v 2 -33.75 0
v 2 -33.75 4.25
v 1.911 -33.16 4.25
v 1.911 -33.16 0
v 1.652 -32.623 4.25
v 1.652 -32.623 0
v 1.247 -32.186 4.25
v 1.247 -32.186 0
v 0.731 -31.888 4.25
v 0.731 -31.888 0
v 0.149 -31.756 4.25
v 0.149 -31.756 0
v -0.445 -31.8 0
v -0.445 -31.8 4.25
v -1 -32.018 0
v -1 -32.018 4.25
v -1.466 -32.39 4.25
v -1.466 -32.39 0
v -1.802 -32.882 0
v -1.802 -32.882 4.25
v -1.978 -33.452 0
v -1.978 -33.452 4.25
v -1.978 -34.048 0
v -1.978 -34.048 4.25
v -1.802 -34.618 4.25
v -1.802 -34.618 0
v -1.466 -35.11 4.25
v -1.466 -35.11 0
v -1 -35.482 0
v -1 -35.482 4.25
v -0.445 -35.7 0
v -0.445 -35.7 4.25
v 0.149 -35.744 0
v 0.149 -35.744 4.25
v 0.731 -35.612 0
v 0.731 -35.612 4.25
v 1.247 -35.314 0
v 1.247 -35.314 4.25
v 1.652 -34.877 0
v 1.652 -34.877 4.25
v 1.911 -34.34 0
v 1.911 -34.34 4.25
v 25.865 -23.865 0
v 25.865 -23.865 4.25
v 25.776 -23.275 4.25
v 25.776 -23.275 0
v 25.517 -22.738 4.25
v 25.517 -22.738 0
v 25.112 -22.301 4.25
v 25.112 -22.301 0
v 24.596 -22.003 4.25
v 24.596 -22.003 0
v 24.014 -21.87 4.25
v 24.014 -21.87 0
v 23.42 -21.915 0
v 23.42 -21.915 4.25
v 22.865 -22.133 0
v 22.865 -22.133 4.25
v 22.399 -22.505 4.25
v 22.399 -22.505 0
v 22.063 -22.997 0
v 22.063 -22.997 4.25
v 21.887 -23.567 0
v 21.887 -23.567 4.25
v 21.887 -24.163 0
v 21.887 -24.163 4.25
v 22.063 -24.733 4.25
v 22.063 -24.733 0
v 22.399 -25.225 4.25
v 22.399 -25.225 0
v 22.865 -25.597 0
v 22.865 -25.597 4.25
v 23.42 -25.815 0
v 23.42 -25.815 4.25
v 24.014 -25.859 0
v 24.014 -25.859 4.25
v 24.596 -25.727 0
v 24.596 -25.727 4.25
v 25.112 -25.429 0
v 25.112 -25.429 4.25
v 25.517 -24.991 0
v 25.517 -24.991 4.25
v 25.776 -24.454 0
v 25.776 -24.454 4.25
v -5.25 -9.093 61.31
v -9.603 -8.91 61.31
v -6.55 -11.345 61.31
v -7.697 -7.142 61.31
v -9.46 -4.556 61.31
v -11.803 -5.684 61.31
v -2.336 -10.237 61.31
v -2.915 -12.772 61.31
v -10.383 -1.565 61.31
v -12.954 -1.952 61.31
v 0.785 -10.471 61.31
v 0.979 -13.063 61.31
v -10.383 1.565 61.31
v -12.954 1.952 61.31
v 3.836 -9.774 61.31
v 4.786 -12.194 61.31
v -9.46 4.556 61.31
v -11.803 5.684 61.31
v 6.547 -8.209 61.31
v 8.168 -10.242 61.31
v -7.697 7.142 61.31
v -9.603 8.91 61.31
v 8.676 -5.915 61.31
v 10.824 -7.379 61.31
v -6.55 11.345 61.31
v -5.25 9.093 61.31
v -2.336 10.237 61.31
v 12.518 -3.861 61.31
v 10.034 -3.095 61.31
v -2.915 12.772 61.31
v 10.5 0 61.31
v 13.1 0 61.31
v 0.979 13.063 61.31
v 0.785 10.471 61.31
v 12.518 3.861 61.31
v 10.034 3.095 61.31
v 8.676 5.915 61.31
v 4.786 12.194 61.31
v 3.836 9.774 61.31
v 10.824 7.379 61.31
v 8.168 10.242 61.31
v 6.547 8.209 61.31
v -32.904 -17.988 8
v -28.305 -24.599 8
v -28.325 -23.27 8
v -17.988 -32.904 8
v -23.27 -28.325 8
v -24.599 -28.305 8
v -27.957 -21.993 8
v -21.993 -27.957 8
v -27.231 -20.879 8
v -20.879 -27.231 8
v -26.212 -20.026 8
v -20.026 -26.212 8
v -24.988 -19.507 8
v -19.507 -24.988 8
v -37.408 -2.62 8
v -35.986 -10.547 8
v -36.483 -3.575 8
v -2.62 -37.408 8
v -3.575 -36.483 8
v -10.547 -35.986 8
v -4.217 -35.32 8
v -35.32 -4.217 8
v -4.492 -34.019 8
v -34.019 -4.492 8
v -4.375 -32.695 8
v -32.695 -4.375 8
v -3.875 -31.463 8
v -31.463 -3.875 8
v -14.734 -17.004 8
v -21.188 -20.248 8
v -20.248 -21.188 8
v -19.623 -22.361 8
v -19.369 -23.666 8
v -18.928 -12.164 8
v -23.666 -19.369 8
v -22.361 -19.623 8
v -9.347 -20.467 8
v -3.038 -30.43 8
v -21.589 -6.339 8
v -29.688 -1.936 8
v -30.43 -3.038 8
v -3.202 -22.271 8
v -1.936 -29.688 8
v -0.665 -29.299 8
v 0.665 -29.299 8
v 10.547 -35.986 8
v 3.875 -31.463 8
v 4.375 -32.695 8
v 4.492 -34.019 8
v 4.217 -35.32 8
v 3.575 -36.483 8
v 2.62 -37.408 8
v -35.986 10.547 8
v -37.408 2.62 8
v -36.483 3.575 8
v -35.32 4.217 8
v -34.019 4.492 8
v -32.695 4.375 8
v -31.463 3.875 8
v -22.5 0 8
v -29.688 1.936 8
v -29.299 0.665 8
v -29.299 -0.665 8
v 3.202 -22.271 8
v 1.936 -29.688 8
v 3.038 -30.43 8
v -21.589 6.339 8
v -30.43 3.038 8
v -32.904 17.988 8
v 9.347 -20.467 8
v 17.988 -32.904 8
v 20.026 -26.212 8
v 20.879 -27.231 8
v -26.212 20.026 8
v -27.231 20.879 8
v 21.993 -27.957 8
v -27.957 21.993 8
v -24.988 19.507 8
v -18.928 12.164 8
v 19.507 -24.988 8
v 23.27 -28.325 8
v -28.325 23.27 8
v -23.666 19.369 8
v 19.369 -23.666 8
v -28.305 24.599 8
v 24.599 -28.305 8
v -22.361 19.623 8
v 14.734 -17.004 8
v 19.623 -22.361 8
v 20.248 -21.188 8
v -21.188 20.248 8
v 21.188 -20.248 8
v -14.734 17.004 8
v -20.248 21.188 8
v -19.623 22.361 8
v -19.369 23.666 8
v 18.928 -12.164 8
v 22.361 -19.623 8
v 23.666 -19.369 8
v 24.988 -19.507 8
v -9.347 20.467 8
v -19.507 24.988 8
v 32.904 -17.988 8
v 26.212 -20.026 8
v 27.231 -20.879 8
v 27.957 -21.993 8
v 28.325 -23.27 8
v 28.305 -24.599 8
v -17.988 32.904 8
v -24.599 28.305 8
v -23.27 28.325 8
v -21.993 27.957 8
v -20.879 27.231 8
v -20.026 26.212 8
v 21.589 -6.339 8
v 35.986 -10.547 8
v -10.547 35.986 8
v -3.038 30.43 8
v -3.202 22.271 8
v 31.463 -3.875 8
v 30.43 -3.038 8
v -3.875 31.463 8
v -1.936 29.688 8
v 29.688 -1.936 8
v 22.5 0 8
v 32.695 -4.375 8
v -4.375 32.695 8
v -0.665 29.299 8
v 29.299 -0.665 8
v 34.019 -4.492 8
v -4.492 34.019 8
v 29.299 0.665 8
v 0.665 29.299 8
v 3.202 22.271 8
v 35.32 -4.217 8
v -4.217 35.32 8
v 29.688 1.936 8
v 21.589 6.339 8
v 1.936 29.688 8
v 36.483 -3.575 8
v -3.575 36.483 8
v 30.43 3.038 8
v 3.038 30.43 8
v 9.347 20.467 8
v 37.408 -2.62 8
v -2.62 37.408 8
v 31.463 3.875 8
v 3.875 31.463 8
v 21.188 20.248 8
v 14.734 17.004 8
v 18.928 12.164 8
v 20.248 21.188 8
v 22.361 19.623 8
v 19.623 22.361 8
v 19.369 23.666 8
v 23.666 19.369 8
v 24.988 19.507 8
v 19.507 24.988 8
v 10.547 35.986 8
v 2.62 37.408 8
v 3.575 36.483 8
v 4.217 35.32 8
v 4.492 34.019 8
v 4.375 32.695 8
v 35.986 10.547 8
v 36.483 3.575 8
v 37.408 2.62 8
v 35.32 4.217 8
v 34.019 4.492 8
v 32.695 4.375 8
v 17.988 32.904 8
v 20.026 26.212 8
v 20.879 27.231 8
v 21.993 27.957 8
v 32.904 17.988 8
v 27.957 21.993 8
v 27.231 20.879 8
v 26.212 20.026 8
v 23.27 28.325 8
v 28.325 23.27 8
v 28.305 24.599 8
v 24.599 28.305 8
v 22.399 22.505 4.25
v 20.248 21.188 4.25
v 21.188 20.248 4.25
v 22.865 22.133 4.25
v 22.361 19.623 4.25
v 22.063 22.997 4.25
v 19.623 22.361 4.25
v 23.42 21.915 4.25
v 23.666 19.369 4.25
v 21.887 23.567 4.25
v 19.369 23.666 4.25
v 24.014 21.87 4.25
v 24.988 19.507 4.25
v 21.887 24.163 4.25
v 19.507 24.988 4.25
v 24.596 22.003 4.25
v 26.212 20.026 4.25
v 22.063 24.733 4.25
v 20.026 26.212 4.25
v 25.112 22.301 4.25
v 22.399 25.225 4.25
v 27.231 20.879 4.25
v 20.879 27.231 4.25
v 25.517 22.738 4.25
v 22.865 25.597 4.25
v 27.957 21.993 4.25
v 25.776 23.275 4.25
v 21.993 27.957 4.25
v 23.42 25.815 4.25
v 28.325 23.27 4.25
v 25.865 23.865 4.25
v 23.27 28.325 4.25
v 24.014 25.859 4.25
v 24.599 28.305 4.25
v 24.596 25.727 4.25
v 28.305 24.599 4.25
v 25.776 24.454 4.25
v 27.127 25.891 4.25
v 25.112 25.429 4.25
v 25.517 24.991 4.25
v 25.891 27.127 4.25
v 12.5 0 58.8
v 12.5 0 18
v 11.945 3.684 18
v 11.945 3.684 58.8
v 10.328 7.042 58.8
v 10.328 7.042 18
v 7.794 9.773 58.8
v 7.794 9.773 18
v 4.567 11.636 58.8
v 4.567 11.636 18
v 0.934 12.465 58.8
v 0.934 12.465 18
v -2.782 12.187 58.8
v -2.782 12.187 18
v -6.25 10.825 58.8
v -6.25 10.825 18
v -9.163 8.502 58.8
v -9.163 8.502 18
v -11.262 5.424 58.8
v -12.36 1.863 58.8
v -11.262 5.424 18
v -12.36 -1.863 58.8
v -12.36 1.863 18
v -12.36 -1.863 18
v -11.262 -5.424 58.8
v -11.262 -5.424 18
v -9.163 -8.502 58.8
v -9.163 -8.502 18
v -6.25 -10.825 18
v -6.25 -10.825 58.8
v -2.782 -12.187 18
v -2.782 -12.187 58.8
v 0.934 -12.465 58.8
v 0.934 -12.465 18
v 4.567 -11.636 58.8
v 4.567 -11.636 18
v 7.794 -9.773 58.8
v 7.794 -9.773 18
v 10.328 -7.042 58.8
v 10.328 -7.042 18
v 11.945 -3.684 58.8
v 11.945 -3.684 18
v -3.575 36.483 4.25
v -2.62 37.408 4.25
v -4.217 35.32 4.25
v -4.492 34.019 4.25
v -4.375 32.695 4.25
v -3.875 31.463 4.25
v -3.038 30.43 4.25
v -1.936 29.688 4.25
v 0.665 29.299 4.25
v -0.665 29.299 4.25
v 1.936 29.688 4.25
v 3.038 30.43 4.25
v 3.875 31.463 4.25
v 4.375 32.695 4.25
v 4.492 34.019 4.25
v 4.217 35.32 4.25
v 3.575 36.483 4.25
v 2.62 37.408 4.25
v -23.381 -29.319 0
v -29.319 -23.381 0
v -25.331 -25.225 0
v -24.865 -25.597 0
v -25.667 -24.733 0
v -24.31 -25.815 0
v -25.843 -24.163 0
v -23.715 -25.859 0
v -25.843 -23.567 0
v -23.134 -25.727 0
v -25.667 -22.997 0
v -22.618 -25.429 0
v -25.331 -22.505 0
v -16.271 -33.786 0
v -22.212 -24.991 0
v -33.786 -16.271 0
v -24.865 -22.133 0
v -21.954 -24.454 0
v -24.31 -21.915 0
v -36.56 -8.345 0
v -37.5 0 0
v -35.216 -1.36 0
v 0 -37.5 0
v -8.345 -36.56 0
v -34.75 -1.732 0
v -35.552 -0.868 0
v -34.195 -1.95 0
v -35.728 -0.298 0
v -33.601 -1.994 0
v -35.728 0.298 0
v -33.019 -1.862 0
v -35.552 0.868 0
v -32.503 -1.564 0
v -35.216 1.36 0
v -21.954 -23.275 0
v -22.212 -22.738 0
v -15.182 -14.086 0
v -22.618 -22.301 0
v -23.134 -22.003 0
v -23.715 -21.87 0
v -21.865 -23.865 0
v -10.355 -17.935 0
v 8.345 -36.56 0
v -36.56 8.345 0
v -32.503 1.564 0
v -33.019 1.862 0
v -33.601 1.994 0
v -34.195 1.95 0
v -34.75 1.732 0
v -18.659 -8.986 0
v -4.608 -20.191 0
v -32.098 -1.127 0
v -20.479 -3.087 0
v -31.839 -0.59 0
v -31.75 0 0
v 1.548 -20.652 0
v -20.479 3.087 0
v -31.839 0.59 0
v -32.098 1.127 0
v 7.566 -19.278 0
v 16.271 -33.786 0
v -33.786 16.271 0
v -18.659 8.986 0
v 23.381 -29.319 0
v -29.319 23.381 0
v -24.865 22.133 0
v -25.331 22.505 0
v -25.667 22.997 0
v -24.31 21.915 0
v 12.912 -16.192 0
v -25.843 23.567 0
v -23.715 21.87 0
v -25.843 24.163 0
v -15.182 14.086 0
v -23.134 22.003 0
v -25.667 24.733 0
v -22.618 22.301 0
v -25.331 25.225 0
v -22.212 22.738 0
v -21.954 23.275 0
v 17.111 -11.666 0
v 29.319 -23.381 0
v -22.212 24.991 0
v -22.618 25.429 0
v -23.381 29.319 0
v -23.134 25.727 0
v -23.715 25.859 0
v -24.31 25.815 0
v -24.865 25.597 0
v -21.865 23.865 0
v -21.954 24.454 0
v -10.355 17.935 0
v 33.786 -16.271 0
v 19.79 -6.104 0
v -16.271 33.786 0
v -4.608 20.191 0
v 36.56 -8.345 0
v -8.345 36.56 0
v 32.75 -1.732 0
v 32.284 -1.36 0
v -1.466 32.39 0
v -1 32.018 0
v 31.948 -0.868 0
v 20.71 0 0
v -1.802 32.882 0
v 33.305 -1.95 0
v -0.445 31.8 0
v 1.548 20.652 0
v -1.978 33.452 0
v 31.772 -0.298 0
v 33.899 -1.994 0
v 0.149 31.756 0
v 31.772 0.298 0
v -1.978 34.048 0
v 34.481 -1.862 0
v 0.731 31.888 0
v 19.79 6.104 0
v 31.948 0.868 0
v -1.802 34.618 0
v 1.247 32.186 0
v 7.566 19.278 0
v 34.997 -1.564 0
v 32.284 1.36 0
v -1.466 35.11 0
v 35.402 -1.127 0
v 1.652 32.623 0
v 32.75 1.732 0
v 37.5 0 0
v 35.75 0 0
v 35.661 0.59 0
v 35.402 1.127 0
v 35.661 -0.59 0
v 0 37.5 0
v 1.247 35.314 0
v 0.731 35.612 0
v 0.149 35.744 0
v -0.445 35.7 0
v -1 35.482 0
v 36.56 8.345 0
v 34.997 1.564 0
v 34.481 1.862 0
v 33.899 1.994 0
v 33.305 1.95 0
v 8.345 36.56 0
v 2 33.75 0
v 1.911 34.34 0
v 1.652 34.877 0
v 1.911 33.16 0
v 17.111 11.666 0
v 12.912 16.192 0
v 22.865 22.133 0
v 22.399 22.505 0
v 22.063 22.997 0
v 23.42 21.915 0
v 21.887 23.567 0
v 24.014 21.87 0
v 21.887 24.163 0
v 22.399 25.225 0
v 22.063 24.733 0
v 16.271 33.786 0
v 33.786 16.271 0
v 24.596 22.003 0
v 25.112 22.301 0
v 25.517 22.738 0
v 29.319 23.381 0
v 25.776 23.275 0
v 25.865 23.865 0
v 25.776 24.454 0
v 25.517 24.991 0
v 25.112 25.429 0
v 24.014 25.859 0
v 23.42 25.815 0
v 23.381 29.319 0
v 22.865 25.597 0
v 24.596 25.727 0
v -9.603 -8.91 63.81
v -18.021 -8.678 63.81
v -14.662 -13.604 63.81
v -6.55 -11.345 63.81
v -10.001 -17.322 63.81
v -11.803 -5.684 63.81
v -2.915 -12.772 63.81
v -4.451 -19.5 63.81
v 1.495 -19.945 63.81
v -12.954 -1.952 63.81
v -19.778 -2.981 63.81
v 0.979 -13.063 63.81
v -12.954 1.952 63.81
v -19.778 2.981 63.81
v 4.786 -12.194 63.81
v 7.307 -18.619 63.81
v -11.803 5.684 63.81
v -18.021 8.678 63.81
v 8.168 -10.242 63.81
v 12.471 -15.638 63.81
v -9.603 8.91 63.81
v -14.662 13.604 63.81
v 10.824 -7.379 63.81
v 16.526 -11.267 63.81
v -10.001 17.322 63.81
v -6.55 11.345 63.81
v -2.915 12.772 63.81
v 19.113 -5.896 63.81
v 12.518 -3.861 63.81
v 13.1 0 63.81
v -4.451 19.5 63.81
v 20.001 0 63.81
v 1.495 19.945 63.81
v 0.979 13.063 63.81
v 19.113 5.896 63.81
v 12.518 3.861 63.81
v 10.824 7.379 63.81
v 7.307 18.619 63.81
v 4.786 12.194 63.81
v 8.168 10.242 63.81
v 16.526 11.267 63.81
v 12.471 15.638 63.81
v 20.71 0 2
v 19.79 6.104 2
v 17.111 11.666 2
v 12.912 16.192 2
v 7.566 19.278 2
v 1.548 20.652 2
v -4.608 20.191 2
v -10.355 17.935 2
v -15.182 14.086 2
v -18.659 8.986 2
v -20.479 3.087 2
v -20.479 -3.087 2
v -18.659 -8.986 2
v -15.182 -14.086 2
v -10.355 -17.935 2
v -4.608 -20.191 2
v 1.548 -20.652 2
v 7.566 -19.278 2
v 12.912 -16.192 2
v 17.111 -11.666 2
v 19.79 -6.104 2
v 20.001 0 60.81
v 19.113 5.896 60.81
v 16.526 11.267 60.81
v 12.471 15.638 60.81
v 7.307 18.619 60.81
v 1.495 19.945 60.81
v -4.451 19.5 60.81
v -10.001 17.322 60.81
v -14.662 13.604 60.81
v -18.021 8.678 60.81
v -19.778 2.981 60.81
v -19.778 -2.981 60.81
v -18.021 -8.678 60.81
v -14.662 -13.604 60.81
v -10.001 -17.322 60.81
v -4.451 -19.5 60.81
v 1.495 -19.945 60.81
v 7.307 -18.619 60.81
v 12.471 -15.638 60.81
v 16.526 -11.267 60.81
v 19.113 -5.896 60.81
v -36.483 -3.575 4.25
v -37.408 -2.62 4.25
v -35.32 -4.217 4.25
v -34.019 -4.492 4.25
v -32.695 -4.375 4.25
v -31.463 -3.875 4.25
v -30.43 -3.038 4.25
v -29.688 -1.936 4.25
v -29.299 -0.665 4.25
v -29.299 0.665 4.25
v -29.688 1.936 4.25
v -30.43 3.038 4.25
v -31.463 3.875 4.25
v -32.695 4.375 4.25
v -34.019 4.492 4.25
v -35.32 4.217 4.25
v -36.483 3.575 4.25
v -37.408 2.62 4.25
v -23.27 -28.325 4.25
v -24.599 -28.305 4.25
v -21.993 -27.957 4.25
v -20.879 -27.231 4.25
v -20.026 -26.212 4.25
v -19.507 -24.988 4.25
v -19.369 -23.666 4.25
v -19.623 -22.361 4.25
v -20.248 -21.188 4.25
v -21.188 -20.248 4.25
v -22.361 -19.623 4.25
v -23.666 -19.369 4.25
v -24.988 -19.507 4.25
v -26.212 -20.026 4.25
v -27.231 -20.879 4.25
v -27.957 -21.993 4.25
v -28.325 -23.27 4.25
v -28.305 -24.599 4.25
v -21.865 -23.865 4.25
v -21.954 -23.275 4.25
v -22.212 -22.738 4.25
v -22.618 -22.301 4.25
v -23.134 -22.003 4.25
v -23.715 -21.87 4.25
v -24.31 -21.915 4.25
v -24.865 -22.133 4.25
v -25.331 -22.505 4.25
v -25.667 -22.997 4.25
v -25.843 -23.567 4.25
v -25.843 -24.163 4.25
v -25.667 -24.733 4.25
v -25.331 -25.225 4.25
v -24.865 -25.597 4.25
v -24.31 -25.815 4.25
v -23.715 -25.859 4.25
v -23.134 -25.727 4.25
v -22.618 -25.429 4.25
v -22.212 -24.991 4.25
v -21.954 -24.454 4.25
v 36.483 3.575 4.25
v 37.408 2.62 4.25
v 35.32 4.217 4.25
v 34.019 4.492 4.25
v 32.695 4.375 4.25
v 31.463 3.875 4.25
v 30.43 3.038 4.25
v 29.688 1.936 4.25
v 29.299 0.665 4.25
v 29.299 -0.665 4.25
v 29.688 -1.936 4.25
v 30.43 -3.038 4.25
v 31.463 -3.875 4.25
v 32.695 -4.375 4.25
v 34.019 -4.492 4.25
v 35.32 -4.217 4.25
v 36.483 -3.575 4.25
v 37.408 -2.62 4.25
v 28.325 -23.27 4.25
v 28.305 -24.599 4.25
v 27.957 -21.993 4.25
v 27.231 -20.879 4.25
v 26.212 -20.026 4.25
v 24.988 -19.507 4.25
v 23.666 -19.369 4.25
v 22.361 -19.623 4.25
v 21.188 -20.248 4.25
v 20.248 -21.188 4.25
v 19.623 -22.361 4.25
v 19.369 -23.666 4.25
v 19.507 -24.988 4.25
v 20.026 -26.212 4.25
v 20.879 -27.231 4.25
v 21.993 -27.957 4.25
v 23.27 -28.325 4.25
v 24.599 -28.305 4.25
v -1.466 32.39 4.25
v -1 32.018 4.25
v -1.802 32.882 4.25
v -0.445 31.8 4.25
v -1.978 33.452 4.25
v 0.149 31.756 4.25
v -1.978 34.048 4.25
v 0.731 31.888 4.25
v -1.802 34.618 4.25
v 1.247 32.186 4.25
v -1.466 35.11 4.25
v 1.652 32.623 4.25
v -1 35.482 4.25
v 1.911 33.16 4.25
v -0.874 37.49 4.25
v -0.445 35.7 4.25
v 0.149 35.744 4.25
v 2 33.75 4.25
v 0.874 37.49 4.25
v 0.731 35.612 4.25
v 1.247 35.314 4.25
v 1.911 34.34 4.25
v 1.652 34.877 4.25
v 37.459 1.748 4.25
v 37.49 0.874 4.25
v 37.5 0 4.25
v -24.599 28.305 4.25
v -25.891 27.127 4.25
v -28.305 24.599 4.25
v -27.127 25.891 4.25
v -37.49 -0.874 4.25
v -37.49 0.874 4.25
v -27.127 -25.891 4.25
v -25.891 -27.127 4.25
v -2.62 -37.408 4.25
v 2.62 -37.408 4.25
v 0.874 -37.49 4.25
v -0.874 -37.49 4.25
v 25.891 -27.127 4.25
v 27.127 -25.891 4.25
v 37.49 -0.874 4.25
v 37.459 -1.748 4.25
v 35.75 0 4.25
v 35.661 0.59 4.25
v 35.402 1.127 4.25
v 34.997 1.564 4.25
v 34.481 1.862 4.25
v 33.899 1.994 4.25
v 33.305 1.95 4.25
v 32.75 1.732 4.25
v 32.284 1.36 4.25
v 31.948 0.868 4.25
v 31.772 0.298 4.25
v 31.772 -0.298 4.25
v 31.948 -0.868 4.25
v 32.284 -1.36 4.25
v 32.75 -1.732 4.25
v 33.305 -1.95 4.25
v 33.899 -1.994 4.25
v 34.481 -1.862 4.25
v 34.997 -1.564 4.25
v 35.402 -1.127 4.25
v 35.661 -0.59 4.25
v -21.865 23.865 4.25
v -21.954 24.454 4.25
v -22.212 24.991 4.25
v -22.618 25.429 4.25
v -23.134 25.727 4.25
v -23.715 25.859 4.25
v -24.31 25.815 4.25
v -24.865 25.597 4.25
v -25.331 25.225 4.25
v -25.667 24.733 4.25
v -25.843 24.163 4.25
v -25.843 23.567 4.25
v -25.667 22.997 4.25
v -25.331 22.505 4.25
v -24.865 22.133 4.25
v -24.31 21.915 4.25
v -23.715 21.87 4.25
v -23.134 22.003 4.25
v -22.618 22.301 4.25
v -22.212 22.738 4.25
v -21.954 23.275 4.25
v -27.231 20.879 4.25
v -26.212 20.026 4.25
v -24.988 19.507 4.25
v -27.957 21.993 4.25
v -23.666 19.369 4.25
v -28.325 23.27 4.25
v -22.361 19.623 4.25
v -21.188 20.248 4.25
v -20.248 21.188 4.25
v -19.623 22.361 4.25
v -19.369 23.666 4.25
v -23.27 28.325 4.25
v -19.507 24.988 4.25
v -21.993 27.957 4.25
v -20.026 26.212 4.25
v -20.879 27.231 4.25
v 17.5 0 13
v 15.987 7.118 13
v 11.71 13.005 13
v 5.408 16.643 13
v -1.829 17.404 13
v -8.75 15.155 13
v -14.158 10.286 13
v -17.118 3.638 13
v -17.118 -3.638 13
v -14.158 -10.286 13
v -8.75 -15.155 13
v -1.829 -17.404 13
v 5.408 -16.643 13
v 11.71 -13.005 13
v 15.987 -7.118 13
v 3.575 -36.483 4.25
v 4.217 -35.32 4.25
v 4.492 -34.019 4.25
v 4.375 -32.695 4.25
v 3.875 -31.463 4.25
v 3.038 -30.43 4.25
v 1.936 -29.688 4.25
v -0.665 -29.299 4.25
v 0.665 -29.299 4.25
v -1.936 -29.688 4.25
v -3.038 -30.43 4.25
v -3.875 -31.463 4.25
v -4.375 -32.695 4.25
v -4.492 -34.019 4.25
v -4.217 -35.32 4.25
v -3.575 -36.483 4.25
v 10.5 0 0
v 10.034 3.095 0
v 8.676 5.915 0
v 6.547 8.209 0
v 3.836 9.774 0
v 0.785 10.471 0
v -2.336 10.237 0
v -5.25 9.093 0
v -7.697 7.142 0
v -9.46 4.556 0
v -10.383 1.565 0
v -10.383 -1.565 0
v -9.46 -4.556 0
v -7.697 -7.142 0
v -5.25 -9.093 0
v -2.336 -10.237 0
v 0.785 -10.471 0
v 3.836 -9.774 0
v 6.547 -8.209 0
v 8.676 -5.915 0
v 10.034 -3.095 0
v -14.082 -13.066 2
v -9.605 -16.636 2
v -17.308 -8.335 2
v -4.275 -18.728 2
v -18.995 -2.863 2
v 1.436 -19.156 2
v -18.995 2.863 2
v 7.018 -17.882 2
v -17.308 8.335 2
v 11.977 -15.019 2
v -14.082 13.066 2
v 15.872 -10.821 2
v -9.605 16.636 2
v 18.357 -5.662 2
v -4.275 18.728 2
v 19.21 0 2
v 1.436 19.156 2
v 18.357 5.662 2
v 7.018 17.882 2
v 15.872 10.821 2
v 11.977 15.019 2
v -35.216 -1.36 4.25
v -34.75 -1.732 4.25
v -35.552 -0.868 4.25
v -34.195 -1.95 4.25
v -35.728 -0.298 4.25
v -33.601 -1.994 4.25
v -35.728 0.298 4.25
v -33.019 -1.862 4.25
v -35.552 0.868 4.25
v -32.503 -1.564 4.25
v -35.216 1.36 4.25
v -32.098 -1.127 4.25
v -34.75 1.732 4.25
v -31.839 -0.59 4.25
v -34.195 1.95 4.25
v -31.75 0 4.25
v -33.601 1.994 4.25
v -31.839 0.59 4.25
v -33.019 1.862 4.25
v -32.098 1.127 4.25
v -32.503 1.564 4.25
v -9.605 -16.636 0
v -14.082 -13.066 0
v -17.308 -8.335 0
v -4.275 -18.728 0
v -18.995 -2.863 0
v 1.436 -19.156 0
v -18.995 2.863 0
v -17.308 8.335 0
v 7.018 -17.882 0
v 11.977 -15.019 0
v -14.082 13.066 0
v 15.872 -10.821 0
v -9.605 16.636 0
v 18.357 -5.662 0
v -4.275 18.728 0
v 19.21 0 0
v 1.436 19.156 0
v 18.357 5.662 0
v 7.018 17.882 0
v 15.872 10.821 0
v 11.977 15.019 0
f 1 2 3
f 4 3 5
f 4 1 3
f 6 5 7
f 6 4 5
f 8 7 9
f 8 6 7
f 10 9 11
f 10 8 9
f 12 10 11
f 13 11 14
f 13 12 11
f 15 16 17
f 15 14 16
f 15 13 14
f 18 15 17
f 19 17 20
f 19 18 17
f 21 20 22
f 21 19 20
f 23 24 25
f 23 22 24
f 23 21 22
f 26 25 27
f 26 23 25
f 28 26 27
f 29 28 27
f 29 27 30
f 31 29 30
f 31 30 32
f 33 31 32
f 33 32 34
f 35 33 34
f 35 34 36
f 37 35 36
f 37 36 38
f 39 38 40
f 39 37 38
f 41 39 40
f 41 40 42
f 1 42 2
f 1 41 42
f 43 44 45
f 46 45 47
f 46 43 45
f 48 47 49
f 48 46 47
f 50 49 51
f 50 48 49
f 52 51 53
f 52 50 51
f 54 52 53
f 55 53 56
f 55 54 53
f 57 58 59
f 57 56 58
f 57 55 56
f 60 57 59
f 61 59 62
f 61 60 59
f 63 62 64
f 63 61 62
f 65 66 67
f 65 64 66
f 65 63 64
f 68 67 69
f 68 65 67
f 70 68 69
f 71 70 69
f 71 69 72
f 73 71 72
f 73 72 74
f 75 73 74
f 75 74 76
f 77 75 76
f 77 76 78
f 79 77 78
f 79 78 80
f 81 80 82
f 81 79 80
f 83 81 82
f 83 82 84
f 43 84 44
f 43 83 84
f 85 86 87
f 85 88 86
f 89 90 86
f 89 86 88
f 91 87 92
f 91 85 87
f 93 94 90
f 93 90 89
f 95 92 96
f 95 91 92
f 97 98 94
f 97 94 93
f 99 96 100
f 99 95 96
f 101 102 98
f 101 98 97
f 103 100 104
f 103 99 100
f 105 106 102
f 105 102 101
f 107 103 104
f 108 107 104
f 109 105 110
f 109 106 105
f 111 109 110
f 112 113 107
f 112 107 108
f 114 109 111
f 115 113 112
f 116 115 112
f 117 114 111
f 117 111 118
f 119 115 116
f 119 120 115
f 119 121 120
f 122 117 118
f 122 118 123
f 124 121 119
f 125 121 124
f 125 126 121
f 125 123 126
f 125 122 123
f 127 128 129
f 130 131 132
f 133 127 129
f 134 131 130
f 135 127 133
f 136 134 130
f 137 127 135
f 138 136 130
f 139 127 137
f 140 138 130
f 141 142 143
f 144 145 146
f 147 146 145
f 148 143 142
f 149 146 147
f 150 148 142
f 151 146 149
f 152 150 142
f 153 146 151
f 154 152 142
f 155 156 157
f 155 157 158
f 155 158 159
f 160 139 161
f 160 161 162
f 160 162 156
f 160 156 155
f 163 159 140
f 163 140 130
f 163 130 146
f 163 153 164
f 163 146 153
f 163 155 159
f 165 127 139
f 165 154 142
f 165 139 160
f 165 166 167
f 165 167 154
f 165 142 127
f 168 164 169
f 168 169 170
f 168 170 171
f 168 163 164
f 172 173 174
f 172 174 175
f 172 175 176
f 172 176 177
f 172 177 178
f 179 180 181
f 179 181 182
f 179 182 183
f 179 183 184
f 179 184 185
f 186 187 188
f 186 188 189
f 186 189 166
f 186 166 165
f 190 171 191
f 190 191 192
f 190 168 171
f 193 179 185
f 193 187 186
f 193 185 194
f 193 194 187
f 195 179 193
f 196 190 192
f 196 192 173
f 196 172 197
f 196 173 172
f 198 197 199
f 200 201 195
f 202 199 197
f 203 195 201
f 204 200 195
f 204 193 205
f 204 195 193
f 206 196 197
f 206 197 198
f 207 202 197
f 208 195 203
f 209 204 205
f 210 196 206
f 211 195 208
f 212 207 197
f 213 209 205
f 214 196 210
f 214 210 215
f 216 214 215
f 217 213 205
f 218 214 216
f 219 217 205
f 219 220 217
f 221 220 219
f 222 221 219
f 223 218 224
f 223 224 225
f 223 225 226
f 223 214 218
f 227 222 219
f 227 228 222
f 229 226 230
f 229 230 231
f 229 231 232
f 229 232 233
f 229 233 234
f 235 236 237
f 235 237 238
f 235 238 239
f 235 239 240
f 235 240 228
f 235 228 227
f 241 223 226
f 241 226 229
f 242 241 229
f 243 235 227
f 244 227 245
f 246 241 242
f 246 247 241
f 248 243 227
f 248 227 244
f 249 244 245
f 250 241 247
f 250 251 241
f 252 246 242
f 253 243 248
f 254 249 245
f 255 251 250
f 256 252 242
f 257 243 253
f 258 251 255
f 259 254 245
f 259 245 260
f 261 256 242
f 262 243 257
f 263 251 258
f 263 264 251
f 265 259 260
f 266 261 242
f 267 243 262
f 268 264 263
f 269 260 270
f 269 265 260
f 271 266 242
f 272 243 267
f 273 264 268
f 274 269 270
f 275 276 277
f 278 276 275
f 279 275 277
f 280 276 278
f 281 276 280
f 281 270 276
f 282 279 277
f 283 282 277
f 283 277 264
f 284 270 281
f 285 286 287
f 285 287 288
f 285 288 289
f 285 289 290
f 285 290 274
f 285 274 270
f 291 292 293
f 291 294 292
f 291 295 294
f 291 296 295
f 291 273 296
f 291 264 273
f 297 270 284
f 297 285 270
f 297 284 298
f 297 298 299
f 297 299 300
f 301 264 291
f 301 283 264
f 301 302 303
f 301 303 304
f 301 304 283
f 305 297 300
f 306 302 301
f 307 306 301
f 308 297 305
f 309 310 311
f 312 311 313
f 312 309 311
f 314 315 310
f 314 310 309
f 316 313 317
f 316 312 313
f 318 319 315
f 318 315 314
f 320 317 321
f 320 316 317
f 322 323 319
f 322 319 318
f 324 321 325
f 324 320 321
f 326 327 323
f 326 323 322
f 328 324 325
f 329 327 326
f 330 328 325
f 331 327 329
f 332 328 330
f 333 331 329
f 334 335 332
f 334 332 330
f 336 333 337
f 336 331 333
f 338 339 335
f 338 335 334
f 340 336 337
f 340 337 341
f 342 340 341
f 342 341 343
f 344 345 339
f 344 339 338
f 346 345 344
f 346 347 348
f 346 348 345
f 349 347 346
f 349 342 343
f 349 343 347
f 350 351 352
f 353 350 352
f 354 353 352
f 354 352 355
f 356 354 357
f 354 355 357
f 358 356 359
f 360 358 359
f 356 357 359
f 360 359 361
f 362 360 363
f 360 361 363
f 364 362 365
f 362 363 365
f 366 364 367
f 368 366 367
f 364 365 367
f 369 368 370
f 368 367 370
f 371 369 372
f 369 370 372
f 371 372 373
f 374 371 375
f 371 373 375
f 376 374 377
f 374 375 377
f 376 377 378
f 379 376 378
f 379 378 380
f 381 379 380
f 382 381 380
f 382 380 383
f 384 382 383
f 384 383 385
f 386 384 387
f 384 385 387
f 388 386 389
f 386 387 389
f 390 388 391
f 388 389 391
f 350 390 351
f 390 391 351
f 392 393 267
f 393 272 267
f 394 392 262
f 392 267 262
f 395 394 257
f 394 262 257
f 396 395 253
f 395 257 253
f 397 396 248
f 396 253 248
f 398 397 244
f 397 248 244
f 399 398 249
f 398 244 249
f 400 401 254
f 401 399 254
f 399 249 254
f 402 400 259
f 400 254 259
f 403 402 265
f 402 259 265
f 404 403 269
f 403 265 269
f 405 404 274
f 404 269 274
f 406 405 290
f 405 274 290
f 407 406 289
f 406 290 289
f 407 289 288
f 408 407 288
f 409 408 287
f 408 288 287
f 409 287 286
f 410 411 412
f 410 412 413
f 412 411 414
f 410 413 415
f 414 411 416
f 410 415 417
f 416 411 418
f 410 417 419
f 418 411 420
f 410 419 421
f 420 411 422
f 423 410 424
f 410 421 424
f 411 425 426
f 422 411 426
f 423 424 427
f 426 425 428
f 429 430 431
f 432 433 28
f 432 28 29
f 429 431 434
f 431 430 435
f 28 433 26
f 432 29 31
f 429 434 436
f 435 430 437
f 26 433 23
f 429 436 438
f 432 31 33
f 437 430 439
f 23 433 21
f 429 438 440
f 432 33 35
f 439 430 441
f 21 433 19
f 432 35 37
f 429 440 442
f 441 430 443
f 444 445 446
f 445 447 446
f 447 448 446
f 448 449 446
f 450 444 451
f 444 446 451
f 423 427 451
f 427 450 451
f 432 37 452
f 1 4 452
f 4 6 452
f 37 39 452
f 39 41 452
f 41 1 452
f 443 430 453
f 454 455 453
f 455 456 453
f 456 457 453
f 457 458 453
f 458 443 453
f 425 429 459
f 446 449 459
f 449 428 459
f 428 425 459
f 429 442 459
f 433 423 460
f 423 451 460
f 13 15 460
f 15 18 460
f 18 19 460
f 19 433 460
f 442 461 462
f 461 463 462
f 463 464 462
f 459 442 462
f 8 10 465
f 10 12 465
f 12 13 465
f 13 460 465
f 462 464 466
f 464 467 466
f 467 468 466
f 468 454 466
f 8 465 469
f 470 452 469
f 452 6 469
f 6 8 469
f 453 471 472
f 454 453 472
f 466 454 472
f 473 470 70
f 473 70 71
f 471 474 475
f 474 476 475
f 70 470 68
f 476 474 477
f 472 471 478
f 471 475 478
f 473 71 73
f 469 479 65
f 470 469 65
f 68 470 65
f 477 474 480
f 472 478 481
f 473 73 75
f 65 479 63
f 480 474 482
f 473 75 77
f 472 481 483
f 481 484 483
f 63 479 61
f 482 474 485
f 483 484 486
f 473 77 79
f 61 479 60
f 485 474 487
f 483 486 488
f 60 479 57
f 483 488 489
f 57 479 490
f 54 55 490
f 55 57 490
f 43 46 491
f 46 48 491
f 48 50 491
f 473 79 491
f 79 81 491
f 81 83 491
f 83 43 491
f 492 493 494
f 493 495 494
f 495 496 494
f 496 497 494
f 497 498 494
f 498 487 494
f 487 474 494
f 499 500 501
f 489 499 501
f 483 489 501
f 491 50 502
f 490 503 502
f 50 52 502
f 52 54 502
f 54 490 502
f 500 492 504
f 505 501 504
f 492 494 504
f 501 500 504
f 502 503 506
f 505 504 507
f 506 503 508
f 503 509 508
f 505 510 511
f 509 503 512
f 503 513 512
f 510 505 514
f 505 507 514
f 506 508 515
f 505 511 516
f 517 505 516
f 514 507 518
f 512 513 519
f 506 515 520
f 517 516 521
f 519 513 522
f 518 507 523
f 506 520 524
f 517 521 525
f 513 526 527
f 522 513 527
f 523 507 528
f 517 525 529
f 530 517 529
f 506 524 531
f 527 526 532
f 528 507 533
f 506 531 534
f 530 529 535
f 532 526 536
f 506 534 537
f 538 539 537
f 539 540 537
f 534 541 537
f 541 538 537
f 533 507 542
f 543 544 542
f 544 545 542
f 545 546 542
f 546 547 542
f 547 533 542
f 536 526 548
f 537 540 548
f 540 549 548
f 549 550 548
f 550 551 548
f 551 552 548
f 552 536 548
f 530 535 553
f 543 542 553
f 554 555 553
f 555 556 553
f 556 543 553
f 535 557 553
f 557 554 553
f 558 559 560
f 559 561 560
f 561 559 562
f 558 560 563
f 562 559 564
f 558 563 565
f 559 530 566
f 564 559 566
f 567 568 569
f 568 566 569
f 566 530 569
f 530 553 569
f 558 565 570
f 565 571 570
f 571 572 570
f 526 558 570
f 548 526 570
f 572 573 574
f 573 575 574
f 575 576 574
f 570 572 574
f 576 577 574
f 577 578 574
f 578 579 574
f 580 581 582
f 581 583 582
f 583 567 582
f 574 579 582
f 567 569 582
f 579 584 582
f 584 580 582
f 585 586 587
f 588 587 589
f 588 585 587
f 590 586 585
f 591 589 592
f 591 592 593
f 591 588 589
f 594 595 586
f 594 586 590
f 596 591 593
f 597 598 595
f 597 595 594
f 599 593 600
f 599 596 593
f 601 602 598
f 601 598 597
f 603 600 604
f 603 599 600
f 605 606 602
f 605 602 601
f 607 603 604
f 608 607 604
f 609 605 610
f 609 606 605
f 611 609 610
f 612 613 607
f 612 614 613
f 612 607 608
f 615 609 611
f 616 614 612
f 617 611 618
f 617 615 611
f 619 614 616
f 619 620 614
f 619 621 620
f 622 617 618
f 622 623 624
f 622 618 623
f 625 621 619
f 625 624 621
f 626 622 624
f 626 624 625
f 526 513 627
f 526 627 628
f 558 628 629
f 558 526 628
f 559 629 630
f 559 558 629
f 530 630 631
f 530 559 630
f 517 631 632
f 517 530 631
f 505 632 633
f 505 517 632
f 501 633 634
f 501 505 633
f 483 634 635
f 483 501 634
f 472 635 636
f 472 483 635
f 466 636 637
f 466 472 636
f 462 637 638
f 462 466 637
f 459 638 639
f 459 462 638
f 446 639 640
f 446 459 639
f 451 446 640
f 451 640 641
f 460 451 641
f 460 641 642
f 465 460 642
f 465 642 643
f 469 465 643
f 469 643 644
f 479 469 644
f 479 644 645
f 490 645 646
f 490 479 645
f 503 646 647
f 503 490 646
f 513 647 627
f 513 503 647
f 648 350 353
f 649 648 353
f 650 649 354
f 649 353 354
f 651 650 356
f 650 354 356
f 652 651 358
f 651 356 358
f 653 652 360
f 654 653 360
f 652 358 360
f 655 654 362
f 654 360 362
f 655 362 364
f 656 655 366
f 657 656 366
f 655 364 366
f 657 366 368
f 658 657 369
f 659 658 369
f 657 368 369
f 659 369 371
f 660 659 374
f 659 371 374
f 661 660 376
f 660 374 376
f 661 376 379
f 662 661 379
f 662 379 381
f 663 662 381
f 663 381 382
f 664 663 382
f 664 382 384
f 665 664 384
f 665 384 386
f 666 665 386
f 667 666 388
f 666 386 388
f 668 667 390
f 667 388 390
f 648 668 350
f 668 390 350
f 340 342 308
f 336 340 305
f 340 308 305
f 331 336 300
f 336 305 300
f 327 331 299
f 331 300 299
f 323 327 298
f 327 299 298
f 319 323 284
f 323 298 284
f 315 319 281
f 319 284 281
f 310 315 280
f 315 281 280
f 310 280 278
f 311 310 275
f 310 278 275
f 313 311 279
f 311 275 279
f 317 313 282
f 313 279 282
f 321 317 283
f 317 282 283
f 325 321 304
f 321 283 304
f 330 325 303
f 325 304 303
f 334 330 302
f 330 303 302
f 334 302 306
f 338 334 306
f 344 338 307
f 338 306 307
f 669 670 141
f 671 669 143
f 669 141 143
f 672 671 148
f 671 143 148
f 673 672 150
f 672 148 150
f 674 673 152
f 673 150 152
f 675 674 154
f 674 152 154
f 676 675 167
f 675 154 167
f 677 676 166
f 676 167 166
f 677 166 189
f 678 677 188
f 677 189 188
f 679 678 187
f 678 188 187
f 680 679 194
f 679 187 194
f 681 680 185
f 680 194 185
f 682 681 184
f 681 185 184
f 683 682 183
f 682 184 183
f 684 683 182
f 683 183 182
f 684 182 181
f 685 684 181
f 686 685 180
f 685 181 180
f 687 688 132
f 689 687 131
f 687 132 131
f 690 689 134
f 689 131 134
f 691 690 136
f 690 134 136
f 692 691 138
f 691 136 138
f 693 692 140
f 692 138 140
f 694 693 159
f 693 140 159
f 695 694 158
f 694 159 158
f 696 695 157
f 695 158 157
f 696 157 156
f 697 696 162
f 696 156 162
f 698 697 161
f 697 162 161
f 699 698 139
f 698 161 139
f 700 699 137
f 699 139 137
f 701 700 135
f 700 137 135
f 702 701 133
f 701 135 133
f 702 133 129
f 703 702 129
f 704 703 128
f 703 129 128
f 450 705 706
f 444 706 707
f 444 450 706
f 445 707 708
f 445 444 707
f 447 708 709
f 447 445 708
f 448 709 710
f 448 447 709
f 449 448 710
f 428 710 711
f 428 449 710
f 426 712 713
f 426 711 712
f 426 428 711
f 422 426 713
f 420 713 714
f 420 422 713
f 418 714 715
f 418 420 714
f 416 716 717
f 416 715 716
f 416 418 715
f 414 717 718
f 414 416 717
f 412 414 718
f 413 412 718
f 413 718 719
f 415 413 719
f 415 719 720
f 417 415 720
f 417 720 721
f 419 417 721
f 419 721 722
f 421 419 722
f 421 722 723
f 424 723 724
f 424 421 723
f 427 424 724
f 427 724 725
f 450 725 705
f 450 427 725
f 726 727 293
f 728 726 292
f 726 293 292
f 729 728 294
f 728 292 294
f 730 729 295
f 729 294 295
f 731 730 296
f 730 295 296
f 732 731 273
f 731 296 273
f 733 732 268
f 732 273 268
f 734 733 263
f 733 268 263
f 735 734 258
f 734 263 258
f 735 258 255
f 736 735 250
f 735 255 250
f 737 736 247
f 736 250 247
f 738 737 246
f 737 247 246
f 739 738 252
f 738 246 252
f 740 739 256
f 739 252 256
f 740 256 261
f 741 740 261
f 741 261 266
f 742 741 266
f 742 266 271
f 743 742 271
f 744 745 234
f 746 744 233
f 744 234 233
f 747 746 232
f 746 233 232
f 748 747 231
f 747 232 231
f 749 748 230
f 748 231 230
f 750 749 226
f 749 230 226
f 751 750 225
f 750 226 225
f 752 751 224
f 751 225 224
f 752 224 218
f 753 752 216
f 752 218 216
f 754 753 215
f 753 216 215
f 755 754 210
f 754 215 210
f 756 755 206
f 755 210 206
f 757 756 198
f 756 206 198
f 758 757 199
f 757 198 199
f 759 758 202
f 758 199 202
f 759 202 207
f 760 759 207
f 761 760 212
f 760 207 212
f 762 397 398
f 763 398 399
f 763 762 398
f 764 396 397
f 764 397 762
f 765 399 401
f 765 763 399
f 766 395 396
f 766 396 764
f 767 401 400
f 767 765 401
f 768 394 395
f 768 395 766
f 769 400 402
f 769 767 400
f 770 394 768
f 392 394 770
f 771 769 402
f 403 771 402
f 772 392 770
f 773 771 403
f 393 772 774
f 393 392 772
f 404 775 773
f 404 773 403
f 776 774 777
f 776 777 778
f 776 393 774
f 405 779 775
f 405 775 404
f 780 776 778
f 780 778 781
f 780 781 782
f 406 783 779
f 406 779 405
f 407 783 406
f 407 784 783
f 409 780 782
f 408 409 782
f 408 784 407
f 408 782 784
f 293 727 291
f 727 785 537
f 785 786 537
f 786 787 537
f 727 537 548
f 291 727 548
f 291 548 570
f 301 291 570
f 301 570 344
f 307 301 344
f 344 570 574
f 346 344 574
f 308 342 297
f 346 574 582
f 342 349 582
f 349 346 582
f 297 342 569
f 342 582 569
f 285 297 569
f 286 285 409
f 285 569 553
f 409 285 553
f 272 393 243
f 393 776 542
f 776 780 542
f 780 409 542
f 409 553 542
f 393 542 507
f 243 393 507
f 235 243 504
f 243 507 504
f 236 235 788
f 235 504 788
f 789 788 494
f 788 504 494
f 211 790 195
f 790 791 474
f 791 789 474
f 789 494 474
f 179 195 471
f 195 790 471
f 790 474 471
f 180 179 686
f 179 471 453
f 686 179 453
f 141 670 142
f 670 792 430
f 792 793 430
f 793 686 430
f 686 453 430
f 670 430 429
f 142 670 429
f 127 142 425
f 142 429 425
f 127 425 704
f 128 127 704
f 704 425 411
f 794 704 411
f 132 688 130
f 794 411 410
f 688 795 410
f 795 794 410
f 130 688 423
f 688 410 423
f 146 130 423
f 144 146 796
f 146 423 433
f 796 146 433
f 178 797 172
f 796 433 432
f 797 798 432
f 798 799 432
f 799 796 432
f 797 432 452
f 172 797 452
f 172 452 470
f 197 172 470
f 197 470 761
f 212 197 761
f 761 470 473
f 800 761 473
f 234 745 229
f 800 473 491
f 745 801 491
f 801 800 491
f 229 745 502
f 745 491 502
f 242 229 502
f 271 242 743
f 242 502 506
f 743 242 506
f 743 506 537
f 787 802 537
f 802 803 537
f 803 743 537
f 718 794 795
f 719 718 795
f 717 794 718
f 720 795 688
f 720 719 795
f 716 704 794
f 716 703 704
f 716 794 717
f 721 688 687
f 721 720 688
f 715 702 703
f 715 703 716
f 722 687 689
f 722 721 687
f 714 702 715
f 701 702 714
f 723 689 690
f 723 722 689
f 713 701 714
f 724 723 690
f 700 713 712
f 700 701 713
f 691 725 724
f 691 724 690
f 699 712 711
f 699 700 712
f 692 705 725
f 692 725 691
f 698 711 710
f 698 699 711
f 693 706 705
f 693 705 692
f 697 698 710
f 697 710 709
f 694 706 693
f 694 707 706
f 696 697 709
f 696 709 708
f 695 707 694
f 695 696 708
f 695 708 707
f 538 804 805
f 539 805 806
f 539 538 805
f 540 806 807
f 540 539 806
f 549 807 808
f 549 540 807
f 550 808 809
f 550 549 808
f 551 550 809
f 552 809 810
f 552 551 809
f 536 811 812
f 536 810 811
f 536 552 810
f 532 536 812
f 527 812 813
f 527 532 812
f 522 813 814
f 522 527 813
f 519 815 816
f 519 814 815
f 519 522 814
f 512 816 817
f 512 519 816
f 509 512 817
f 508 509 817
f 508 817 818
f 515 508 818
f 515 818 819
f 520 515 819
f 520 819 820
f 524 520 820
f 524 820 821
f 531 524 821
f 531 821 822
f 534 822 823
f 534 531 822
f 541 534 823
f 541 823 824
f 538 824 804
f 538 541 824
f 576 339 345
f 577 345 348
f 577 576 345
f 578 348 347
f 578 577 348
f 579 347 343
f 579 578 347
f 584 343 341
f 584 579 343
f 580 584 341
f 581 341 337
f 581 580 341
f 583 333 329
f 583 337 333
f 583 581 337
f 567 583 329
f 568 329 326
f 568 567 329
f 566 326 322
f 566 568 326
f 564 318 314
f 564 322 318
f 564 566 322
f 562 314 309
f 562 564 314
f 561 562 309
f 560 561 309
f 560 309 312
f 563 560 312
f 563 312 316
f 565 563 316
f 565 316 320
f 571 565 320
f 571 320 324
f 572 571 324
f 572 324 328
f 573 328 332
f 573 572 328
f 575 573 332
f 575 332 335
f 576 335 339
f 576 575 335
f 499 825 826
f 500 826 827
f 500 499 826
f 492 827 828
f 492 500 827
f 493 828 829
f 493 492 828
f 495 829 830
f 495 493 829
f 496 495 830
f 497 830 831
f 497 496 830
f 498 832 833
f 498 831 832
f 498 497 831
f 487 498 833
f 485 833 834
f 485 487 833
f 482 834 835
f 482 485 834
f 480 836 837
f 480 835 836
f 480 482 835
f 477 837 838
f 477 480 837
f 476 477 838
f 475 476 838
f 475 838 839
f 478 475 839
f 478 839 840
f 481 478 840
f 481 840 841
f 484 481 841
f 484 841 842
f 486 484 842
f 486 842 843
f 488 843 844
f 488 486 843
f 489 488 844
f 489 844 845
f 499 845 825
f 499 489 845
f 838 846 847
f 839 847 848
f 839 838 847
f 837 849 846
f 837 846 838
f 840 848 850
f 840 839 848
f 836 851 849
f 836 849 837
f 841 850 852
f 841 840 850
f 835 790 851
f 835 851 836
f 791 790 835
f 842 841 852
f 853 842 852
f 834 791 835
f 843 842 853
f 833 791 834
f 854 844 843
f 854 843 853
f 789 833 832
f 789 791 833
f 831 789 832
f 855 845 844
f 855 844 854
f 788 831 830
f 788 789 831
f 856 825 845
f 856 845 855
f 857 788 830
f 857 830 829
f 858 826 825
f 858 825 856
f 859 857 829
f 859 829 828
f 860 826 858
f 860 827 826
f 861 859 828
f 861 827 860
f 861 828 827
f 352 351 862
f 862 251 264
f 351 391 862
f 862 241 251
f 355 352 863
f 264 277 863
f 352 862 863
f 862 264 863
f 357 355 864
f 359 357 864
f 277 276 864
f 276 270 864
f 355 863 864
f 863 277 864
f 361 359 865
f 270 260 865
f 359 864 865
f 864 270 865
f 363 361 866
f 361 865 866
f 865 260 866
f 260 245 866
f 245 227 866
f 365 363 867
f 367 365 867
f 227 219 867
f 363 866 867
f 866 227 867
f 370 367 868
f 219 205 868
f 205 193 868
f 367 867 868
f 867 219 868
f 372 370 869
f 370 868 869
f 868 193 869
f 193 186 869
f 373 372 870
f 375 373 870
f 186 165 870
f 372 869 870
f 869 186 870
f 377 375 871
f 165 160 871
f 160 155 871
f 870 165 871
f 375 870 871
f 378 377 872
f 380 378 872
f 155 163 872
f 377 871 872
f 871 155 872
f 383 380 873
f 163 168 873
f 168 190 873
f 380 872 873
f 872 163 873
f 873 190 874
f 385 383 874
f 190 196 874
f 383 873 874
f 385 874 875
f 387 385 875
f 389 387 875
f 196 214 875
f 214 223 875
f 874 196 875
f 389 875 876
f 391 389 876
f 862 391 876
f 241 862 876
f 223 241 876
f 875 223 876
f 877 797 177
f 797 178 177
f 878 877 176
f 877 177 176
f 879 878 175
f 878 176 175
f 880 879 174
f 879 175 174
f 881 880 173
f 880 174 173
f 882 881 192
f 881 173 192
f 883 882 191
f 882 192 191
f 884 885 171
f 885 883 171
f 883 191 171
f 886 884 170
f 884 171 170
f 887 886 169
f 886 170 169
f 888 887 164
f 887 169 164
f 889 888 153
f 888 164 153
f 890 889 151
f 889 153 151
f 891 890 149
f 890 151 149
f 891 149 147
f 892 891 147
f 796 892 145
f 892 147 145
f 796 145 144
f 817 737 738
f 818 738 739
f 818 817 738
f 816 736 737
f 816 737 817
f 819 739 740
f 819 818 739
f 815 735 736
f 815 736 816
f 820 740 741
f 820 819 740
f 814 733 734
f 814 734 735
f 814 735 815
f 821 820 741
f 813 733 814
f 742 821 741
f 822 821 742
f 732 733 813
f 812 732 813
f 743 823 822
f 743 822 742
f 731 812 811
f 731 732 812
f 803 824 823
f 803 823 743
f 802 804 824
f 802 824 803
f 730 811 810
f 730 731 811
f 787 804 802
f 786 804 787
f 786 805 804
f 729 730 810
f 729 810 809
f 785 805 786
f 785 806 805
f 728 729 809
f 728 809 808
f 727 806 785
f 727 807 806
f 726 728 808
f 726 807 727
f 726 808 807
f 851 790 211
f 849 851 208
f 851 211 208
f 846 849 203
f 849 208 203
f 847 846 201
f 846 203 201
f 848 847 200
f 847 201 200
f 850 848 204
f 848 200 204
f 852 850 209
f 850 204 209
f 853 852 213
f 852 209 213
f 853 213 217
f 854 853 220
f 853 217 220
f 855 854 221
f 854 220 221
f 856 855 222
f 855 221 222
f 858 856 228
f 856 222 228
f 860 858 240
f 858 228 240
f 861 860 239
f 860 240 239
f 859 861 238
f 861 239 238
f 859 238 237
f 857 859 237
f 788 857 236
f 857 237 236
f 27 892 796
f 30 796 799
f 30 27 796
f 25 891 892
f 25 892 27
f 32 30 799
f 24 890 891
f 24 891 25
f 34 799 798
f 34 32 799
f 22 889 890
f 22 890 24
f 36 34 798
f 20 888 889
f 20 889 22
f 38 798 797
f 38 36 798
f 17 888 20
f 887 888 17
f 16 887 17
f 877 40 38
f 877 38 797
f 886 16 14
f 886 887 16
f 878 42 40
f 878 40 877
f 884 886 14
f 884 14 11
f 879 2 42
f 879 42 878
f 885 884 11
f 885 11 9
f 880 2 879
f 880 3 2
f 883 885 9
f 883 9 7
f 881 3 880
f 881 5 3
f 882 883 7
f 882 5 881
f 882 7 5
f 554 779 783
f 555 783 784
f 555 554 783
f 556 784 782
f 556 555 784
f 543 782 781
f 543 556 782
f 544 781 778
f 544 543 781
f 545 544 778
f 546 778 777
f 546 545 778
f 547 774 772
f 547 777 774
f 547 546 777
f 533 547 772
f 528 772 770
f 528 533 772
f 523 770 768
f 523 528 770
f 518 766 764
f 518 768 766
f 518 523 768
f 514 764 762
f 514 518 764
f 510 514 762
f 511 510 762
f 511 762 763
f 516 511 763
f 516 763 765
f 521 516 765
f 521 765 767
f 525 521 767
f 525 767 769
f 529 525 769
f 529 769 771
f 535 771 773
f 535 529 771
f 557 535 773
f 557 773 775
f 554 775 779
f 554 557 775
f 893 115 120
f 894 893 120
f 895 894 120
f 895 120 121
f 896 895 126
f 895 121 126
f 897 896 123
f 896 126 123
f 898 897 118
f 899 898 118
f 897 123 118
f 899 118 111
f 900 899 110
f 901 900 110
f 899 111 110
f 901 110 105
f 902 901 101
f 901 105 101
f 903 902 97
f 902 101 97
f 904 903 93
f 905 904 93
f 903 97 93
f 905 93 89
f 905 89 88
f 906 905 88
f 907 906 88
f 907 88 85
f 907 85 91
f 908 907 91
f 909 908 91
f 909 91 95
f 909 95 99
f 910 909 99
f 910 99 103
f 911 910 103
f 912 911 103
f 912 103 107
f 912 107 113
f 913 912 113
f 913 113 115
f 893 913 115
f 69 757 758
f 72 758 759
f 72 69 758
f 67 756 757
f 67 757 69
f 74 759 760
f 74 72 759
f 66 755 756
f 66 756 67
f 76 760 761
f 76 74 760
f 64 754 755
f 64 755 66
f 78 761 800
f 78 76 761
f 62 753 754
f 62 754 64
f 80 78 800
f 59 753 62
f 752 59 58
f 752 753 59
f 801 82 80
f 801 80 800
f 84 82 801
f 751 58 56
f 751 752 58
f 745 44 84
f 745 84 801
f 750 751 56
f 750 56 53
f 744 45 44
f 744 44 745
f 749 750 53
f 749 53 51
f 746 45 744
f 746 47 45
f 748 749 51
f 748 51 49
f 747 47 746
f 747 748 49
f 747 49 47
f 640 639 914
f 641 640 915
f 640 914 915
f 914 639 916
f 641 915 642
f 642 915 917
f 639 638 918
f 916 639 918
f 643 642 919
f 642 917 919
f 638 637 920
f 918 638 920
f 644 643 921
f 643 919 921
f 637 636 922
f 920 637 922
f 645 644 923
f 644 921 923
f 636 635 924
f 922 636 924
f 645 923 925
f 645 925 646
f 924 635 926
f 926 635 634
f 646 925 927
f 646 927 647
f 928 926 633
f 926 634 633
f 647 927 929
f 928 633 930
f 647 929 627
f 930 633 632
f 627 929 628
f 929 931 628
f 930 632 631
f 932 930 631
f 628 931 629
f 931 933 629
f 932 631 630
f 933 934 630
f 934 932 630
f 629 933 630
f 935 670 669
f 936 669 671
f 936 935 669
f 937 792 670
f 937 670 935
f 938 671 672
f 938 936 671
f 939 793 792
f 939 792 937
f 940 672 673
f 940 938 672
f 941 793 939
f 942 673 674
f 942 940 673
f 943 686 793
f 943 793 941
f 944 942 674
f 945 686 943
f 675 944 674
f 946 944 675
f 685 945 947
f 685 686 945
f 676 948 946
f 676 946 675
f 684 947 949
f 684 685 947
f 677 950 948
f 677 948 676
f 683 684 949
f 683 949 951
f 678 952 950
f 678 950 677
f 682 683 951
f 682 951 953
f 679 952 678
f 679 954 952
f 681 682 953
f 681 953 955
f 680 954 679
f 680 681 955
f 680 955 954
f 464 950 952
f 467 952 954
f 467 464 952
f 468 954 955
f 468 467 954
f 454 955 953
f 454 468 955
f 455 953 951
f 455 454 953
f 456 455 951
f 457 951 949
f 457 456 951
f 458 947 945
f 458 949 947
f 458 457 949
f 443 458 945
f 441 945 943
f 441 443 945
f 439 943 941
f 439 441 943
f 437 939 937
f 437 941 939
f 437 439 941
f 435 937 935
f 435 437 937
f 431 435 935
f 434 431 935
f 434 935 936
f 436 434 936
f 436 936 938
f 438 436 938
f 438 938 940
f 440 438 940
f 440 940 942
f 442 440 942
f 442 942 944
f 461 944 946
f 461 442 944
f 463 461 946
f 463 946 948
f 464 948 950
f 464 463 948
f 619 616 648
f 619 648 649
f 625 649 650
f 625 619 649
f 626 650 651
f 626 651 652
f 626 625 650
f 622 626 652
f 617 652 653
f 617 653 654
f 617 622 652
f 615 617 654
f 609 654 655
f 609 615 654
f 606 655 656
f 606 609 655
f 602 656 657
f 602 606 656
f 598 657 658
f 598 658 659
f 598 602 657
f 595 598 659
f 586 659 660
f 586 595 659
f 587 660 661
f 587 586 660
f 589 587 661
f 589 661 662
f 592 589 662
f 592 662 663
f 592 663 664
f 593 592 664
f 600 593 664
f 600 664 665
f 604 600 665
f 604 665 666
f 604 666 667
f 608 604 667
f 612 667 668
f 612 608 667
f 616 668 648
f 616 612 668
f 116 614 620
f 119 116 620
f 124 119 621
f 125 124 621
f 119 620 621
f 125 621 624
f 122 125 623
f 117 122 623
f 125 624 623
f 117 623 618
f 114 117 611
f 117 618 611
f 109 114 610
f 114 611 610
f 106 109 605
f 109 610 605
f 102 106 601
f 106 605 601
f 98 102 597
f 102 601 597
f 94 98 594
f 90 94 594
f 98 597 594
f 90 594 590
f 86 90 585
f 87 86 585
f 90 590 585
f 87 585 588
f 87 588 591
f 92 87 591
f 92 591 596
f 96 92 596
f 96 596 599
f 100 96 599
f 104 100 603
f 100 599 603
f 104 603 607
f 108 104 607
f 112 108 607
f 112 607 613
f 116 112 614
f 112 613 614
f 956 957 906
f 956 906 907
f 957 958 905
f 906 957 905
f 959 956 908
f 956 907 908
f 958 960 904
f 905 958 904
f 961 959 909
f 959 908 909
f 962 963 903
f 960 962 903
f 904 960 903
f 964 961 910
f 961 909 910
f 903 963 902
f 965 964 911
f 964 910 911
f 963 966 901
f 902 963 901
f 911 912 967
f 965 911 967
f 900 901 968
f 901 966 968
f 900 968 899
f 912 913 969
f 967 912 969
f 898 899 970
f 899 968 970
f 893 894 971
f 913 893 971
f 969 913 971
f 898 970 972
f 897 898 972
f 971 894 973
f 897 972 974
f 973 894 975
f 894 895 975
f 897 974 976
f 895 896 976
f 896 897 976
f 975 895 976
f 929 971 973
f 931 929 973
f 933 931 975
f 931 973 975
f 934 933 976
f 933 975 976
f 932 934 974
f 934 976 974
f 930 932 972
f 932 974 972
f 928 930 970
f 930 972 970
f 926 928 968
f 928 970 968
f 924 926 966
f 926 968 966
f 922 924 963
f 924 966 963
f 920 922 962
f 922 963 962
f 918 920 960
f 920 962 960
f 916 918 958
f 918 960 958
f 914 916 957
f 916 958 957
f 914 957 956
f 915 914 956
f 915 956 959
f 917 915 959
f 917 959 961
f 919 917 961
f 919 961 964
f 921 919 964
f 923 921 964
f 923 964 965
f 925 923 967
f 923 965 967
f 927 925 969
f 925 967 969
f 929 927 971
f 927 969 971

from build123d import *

# Parameters (mm, degrees)
SKETCH2_R           = 37.5
SKETCH2_R_2         = 5.35
BOSS_EXTRUDE2_DEPTH = 8
SKETCH14_R          = 2
CUT_EXTRUDE6_DEPTH  = 54.633012222
SKETCH3_R           = 20.71
SKETCH3_R_2         = 19.21
CUT_EXTRUDE2_DEPTH  = 2
SKETCH7_R           = 12.5
SKETCH7_R_2         = 10.5
BOSS_EXTRUDE4_DEPTH = 50.8
SKETCH10_R          = 12.5
BOSS_EXTRUDE5_DEPTH = 2.01
BOSS_EXTRUDE5_DRAFT = -75
SKETCH11_R          = 10.5
CUT_EXTRUDE3_DEPTH  = 81.686777727
BOSS_EXTRUDE6_START = 3
SKETCH12_R          = 20.001422123
SKETCH12_R_2        = 10.5
BOSS_EXTRUDE6_DEPTH = 3
SKETCH13_R          = 13.1
CUT_EXTRUDE4_DEPTH  = 2.5
CHAMFER1_SIZE       = 10
SKETCH17_R          = 4.5
CUT_EXTRUDE8_DEPTH  = 3.75


with BuildPart() as part:
    # Sketch2 → Boss-Extrude2 (new body)
    with BuildSketch(Plane.XY):
        Circle(SKETCH2_R)
        Circle(SKETCH2_R_2, mode=Mode.SUBTRACT)
    extrude(amount=BOSS_EXTRUDE2_DEPTH)

    # Sketch14 → Cut-Extrude6 (cut, through all)
    with BuildSketch(Plane.XY):
        with Locations((0, 33.75)):
            Circle(SKETCH14_R)
        with Locations((-23.864853865, 23.864853865)):
            Circle(SKETCH14_R)
        with Locations((-33.75, 0)):
            Circle(SKETCH14_R)
        with Locations((-23.864853865, -23.864853865)):
            Circle(SKETCH14_R)
        with Locations((0, -33.75)):
            Circle(SKETCH14_R)
        with Locations((23.864853865, -23.864853865)):
            Circle(SKETCH14_R)
        with Locations((33.75, 0)):
            Circle(SKETCH14_R)
        with Locations((23.864853865, 23.864853865)):
            Circle(SKETCH14_R)
    extrude(amount=CUT_EXTRUDE6_DEPTH, mode=Mode.SUBTRACT)

    # Sketch3 → Cut-Extrude2 (cut)
    with BuildSketch(Plane.XY):
        Circle(SKETCH3_R)
        Circle(SKETCH3_R_2, mode=Mode.SUBTRACT)
    extrude(amount=CUT_EXTRUDE2_DEPTH, mode=Mode.SUBTRACT)

    # Sketch7 → Boss-Extrude4 (add)
    with BuildSketch(Plane.XY.offset(8)):
        Circle(SKETCH7_R)
        Circle(SKETCH7_R_2, mode=Mode.SUBTRACT)
    extrude(amount=BOSS_EXTRUDE4_DEPTH)


with BuildPart() as boss_extrude5_tool:
    # Sketch10 → Boss-Extrude5 (with draft: the straight prism first)
    with BuildSketch(Plane.XY.offset(58.8)):
        Circle(SKETCH10_R)
    extrude(amount=BOSS_EXTRUDE5_DEPTH)
    # Boss-Extrude5: the draft: its side faces are tilted about the plane it starts from
    boss_extrude5_sides = [boss_extrude5_tool.faces().sort_by_distance(p)[0] for p in [
        (-12.5, 0, 59.805),
    ]]
    draft(boss_extrude5_sides, Plane.XY.offset(58.8), BOSS_EXTRUDE5_DRAFT)


with BuildPart() as part_1:
    add(part.part)

    # Boss-Extrude5: add boss_extrude5_tool
    add(boss_extrude5_tool.part)

    # Sketch11 → Cut-Extrude3 (cut, through all)
    with BuildSketch(Plane.XY.offset(60.81)):
        Circle(SKETCH11_R)
    extrude(amount=-CUT_EXTRUDE3_DEPTH, mode=Mode.SUBTRACT)

    # Sketch12 → Boss-Extrude6 (add)
    with BuildSketch(Plane.XY.offset(60.81).offset(BOSS_EXTRUDE6_START)):
        Circle(SKETCH12_R)
        Circle(SKETCH12_R_2, mode=Mode.SUBTRACT)
    extrude(amount=-BOSS_EXTRUDE6_DEPTH)

    # Sketch13 → Cut-Extrude4 (cut)
    with BuildSketch(Plane.XY.offset(63.81)):
        Circle(SKETCH13_R)
    extrude(amount=-CUT_EXTRUDE4_DEPTH, mode=Mode.SUBTRACT)

    # Chamfer1
    chamfer1_edges = [part_1.edges().sort_by_distance(p)[0] for p in [
        (-12.5, 0, 8),
    ]]
    chamfer(chamfer1_edges, length=CHAMFER1_SIZE)

    # Sketch17 → Cut-Extrude8 (cut)
    with BuildSketch(Plane.XY.offset(8)):
        with Locations((-23.864853865, 23.864853865)):
            Circle(SKETCH17_R)
        with Locations((-33.75, 0)):
            Circle(SKETCH17_R)
        with Locations((0, 33.75)):
            Circle(SKETCH17_R)
        with Locations((23.864853865, 23.864853865)):
            Circle(SKETCH17_R)
        with Locations((33.75, 0)):
            Circle(SKETCH17_R)
        with Locations((23.864853865, -23.864853865)):
            Circle(SKETCH17_R)
        with Locations((0, -33.75)):
            Circle(SKETCH17_R)
        with Locations((-23.864853865, -23.864853865)):
            Circle(SKETCH17_R)
    extrude(amount=-CUT_EXTRUDE8_DEPTH, mode=Mode.SUBTRACT)


solid = part_1.part
